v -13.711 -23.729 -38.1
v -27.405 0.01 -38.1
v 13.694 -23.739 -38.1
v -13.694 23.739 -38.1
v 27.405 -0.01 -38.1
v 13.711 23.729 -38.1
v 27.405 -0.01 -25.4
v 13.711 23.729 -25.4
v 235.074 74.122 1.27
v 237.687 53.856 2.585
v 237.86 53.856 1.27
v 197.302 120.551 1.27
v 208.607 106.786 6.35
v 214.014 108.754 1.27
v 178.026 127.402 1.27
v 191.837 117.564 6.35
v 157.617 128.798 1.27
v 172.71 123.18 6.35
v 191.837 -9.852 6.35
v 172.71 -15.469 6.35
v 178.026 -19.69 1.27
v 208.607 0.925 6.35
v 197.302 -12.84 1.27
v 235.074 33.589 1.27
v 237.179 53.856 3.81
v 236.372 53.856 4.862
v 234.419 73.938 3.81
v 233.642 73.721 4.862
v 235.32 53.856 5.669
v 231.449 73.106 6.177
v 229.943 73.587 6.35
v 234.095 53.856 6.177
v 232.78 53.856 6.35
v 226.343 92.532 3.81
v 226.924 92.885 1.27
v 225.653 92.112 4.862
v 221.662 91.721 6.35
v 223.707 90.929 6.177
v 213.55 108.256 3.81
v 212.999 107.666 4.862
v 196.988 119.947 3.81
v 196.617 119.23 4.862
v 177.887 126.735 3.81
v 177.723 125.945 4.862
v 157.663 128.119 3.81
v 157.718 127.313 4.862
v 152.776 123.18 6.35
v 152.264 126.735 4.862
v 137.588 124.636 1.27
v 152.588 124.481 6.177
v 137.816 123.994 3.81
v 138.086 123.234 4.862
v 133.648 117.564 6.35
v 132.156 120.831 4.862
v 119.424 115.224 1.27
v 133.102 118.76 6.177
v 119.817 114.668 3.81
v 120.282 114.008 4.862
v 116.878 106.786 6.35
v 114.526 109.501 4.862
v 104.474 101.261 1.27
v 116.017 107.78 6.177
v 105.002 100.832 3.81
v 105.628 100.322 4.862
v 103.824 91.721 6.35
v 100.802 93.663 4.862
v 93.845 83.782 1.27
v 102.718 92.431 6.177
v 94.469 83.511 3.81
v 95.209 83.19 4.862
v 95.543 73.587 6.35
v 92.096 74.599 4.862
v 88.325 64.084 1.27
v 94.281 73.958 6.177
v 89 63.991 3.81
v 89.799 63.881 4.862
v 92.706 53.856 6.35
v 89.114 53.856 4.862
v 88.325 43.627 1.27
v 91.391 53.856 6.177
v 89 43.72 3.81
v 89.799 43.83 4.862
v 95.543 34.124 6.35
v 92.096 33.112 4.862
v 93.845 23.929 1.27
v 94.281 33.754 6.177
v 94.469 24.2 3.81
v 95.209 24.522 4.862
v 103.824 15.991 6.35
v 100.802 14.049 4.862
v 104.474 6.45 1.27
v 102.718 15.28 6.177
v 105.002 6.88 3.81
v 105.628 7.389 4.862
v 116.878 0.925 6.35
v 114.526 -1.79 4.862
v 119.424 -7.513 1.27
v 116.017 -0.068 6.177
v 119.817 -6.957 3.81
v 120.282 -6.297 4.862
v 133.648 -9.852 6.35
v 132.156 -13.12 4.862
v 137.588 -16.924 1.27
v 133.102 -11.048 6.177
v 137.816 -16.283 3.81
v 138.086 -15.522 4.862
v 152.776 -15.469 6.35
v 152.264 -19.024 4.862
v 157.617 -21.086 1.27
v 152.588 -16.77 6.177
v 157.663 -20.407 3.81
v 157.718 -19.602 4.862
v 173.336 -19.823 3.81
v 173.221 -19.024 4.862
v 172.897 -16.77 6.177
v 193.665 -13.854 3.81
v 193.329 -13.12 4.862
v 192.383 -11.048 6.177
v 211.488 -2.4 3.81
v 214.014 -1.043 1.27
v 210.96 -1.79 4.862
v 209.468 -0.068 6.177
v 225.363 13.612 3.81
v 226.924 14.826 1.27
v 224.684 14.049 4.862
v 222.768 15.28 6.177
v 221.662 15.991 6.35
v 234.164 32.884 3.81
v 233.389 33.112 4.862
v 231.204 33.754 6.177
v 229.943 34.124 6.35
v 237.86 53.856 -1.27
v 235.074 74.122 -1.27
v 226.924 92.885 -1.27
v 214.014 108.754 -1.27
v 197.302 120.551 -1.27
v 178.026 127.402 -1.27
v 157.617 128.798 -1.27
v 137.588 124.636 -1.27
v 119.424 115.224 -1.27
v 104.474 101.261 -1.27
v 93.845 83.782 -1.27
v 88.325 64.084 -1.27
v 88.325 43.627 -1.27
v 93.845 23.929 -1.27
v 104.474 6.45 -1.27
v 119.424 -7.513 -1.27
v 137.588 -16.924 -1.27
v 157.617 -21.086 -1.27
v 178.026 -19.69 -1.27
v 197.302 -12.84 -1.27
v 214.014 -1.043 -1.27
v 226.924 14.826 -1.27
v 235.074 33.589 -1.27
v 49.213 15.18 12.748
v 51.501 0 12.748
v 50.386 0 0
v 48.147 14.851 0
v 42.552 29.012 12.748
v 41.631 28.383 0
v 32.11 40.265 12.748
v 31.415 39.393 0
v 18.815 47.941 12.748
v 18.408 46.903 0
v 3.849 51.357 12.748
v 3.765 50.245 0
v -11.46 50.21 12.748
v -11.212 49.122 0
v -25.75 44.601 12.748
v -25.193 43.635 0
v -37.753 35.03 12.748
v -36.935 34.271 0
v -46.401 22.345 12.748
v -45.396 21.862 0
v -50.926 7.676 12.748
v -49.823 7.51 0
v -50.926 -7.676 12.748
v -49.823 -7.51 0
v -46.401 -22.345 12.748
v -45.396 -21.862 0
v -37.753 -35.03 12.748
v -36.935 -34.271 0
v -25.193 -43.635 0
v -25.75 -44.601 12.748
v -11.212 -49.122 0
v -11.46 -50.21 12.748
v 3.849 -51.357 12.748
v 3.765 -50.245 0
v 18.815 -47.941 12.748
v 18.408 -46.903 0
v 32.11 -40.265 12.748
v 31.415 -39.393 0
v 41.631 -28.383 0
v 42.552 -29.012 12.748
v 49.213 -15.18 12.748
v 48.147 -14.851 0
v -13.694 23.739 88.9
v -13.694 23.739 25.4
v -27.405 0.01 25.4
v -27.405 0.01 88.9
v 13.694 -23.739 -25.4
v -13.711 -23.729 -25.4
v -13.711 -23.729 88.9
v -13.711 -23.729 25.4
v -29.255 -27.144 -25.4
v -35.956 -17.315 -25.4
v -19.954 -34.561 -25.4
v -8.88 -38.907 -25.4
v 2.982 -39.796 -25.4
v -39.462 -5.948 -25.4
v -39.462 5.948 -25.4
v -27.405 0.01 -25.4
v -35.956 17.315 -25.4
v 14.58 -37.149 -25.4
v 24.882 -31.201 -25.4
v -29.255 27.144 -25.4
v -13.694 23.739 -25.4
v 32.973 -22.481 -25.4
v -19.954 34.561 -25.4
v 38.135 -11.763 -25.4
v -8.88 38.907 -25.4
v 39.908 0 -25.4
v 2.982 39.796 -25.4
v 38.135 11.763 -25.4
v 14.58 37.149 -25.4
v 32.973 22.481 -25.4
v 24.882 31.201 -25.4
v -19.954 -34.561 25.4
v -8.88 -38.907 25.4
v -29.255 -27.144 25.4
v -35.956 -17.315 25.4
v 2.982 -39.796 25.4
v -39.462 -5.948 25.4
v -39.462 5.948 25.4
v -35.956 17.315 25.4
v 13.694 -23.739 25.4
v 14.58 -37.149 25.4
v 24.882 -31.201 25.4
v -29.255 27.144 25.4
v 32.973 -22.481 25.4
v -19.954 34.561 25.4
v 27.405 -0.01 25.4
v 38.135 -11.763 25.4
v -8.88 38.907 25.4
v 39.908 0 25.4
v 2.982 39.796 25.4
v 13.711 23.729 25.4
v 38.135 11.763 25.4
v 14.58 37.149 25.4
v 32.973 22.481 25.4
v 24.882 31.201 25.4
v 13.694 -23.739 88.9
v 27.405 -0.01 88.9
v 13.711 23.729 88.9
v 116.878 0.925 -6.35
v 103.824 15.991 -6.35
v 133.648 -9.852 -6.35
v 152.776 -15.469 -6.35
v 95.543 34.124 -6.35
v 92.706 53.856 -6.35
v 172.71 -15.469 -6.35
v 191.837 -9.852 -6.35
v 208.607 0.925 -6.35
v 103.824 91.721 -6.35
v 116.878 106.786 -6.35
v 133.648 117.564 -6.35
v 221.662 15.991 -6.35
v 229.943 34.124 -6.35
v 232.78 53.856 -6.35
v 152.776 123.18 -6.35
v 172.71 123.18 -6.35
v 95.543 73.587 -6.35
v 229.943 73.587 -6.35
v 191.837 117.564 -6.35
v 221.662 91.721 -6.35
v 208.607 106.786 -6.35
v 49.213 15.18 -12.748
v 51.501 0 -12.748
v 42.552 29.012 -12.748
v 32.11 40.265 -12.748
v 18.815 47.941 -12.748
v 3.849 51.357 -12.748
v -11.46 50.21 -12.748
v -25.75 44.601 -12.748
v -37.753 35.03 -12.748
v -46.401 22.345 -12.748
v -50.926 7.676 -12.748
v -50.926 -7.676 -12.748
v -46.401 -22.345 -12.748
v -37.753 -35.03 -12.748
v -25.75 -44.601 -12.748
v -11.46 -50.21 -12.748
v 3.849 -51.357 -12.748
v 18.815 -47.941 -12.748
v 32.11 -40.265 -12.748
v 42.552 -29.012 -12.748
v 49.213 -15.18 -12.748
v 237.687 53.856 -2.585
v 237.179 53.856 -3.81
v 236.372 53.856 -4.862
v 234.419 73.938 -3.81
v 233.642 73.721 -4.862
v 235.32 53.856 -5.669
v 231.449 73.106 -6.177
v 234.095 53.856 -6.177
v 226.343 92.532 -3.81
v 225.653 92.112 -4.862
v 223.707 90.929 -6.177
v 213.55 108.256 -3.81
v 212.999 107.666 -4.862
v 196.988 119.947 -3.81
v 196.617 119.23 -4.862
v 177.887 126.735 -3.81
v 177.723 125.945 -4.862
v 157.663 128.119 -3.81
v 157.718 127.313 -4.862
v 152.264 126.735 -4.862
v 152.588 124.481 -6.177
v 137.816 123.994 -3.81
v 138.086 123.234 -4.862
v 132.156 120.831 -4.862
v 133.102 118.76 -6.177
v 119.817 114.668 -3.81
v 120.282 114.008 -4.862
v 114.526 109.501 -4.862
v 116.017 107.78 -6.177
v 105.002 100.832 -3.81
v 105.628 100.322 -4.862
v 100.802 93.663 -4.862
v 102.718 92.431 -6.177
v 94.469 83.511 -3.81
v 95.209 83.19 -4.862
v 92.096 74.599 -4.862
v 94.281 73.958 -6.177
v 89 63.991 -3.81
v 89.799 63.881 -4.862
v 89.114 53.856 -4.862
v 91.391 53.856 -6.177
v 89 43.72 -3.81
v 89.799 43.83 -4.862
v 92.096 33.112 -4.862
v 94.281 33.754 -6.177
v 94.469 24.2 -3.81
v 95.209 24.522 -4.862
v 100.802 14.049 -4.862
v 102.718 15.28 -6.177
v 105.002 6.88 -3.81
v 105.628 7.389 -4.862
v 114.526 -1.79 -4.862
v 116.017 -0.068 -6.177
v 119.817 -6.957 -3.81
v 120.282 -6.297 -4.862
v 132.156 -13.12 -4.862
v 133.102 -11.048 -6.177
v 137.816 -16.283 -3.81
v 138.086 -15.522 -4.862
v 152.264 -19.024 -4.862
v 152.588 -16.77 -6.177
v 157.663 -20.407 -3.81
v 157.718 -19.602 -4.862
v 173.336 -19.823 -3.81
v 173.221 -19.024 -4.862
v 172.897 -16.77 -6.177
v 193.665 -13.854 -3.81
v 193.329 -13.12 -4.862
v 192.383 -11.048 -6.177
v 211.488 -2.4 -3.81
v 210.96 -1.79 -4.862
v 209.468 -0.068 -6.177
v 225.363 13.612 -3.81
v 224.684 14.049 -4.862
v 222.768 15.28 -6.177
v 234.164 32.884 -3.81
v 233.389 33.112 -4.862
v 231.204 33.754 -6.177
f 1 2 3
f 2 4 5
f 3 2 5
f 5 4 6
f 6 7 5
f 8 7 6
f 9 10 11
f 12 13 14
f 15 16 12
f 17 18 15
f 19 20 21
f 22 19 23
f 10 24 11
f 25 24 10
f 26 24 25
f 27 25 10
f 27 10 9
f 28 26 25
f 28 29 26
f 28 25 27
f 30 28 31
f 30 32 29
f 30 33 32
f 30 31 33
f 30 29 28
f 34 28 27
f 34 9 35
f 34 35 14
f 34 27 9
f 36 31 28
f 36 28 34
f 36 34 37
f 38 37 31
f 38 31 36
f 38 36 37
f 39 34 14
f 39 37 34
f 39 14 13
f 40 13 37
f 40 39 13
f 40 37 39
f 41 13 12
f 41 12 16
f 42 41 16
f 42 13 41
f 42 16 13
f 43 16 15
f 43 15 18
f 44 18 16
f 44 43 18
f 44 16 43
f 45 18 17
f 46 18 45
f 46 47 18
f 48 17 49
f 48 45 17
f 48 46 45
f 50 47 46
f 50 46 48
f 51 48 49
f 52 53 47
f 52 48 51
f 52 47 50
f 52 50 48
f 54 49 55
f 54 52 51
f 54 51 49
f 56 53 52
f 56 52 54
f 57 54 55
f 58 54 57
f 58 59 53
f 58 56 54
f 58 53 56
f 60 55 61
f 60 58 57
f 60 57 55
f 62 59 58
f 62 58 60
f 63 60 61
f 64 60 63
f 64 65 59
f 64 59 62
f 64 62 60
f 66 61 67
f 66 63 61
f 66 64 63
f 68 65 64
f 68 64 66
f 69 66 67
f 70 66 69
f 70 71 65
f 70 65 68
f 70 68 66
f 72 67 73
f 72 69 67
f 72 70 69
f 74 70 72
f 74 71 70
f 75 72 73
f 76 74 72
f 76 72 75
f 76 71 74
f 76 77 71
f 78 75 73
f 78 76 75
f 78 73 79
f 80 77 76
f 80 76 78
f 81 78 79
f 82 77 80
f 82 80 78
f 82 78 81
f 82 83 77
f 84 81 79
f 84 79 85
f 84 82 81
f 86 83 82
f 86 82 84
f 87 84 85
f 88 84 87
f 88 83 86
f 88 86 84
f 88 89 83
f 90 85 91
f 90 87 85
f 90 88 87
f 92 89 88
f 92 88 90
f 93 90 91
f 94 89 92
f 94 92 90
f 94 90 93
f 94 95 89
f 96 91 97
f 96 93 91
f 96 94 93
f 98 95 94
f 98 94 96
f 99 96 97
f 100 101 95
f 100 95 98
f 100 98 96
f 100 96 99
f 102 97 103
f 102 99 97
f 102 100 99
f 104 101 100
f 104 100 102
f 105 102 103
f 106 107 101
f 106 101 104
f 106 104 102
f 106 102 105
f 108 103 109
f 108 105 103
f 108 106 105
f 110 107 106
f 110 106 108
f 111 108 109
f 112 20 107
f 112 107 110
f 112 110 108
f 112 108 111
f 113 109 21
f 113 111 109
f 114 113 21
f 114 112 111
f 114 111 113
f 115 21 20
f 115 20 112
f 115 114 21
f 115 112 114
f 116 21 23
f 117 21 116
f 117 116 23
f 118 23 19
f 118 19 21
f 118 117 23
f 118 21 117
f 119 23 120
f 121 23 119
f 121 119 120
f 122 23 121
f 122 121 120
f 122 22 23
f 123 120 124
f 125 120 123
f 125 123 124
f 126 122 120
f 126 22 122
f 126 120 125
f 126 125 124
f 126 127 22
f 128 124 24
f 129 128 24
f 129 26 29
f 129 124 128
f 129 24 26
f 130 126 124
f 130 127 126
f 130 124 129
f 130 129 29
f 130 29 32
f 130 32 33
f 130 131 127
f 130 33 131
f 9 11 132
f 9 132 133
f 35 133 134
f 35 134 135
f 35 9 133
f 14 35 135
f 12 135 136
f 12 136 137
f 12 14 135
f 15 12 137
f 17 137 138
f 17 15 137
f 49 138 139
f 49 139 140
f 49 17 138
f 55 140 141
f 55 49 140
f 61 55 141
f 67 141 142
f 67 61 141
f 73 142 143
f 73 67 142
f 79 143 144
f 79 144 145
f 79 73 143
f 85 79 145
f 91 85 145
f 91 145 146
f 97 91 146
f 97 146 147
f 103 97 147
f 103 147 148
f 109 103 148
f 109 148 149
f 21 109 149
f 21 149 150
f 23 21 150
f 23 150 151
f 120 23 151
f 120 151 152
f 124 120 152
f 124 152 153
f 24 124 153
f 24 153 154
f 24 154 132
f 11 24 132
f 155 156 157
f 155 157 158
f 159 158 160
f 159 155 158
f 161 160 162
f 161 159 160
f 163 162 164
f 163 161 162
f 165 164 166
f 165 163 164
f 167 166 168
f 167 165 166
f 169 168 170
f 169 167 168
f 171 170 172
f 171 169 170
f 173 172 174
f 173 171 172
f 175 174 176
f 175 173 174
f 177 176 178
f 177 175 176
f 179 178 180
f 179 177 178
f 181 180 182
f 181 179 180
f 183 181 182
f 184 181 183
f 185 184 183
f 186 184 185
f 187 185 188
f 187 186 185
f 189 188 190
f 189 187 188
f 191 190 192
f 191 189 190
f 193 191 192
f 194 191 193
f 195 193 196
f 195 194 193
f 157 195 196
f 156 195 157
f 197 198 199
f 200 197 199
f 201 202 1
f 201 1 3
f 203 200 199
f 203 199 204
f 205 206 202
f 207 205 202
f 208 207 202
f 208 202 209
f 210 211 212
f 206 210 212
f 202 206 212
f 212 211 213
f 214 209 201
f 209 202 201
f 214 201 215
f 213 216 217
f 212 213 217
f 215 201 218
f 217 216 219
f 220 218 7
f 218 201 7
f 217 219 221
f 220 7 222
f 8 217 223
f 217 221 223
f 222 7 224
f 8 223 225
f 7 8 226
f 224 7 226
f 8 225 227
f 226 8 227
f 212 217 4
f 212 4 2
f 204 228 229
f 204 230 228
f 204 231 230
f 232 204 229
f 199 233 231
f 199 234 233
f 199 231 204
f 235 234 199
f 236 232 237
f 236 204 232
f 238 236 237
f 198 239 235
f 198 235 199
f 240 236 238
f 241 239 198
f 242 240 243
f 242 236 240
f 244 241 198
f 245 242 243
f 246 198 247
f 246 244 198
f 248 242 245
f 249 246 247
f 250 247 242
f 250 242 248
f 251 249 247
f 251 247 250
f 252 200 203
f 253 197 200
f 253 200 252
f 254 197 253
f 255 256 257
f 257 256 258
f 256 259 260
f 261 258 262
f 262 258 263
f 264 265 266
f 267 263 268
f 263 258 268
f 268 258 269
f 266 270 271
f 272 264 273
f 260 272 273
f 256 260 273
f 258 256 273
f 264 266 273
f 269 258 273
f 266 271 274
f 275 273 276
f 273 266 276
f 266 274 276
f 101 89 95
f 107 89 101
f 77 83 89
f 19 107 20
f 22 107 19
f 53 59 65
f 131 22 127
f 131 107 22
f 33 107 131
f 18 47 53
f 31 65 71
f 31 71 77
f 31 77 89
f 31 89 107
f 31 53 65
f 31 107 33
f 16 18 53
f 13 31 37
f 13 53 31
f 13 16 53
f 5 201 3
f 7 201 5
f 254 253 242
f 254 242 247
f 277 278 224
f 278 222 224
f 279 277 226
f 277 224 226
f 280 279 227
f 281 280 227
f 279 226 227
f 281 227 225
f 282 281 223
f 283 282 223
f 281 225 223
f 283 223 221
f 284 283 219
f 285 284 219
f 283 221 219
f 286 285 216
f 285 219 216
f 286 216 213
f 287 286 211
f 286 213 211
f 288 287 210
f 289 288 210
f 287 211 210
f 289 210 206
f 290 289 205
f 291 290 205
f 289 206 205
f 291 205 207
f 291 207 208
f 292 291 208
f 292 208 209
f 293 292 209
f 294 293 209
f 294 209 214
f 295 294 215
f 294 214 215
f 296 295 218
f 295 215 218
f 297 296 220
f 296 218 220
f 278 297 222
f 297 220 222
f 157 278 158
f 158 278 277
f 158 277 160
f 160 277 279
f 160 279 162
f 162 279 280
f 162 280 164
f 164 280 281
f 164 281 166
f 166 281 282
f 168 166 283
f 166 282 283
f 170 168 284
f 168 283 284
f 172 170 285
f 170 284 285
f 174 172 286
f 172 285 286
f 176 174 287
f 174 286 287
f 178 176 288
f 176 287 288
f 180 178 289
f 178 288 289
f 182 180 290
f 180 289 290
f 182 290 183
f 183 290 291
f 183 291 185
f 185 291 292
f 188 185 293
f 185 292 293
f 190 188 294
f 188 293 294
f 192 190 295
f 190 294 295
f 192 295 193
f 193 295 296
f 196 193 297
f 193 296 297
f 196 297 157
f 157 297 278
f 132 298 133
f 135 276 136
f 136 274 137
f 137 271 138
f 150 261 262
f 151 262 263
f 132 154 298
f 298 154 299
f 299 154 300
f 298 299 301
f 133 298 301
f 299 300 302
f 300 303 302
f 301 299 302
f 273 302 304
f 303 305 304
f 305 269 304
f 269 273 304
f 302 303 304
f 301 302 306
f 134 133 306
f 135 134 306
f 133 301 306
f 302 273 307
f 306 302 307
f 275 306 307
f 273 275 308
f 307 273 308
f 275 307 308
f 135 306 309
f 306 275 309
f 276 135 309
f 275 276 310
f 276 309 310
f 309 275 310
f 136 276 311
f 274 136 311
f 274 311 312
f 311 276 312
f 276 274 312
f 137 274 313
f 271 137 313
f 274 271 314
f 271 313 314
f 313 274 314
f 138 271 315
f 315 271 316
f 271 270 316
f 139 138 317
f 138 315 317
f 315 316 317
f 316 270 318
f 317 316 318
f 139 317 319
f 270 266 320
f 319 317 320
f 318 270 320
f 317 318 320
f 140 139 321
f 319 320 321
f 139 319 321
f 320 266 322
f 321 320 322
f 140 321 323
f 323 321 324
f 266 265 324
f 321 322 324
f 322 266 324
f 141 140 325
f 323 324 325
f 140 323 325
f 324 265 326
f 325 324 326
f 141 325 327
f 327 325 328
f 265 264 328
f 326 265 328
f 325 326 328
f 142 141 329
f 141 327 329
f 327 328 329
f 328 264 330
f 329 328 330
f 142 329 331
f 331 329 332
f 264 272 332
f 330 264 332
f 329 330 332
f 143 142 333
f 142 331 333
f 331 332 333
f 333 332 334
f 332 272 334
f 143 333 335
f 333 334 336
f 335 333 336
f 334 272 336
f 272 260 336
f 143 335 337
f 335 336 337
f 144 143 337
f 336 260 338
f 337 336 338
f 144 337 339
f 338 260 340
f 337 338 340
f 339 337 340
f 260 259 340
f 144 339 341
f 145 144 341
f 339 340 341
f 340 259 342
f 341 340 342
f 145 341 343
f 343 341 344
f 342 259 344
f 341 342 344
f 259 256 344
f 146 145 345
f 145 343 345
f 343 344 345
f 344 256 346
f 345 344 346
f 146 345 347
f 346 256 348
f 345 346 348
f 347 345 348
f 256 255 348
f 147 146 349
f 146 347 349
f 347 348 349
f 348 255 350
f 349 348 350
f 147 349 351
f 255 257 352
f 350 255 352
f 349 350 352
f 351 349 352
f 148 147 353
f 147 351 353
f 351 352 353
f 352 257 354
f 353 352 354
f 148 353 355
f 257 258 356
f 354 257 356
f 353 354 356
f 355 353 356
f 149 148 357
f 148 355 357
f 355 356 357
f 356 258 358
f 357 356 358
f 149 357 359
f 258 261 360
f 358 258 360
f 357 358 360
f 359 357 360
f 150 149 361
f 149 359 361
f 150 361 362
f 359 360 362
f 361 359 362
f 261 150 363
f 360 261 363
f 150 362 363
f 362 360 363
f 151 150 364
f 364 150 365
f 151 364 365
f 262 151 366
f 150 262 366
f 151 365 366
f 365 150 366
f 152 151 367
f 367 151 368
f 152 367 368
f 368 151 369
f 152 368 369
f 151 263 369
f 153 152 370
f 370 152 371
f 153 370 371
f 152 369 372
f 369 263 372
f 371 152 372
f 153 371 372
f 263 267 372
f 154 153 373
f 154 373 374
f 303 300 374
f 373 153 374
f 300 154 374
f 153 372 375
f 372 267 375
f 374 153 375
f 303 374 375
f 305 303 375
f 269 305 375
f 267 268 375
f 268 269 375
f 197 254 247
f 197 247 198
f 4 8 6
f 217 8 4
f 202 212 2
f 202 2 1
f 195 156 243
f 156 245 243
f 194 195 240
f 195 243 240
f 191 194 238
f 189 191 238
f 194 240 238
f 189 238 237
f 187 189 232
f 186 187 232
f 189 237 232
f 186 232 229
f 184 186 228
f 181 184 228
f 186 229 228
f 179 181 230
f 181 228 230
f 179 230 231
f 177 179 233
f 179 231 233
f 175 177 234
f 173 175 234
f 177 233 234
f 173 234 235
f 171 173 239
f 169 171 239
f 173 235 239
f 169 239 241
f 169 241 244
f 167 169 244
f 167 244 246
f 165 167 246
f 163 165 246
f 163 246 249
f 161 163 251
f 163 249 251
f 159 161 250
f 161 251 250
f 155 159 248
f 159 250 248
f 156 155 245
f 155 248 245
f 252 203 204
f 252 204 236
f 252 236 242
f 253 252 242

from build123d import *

# Parameters (mm, degrees)
F0_R     = 50.3856473316
F1_DEPTH = 25.4
F1_TAPER = -5
F0_R_2   = 75.1170486434
F2_DEPTH = 6.35
F4_DEPTH = 63.5
F6_R     = 5.08


# Not quite as in the source:
# - a fillet or chamfer that OpenCascade refuses, or shapes differently, is made with other operations: its cross-section is extruded or revolved along the edge and cut away or added


with BuildPart() as f1:
    # F0 (on Top) → F1 (new body, symmetric)
    with BuildSketch(Plane.XY):
        Circle(F0_R)
    extrude(amount=F1_DEPTH, both=True, taper=F1_TAPER)

    # F3 (on face) → F4 (join, symmetric)
    with BuildSketch(Plane.XY.offset(25.4)):
        Polygon((-13.6938337482, 23.7386310616), (-27.4051744245, 0.0101076296), (-13.7113406763, -23.728523432), (13.6938337482, -23.7386310616), (27.4051744245, -0.0101076296), (13.7113406763, 23.728523432), align=None)
    extrude(amount=F4_DEPTH, both=True)

    # F5: chamfer of 12.7 on 2 edges, made by hand

    # F5_s1 → F5_t2 (revolve, cut)
    with BuildSketch(Plane.XZ):
        Polygon((51.5009814523, -12.7483273342), (39.9078593852, -25.4), (52.6078593852, -25.4), align=None)
    revolve(axis=Axis((0, 0, -25.4), (0, 0, 1)), mode=Mode.SUBTRACT)

    # F5_s3 → F5_t4 (revolve, cut)
    with BuildSketch(Plane.XZ):
        Polygon((51.5009814523, 12.7483273342), (39.9078593852, 25.4), (52.6078593852, 25.4), align=None)
    revolve(axis=Axis((0, 0, 25.4), (0, 0, -1)), mode=Mode.SUBTRACT)


with BuildPart() as f2:
    # F0 (on Top) → F2 (new body, symmetric)
    with BuildSketch(Plane.XY):
        with Locations((162.7428382635, 53.8556501269)):
            Circle(F0_R_2)
    extrude(amount=F2_DEPTH, both=True)

    # F6
    f6_edges = [f2.edges().sort_by_distance(p)[0] for p in [
        (87.62579, 53.85565, -6.35),
        (87.62579, 53.85565, 6.35),
    ]]
    fillet(f6_edges, radius=F6_R)


solid = Compound([f1.part, f2.part])
